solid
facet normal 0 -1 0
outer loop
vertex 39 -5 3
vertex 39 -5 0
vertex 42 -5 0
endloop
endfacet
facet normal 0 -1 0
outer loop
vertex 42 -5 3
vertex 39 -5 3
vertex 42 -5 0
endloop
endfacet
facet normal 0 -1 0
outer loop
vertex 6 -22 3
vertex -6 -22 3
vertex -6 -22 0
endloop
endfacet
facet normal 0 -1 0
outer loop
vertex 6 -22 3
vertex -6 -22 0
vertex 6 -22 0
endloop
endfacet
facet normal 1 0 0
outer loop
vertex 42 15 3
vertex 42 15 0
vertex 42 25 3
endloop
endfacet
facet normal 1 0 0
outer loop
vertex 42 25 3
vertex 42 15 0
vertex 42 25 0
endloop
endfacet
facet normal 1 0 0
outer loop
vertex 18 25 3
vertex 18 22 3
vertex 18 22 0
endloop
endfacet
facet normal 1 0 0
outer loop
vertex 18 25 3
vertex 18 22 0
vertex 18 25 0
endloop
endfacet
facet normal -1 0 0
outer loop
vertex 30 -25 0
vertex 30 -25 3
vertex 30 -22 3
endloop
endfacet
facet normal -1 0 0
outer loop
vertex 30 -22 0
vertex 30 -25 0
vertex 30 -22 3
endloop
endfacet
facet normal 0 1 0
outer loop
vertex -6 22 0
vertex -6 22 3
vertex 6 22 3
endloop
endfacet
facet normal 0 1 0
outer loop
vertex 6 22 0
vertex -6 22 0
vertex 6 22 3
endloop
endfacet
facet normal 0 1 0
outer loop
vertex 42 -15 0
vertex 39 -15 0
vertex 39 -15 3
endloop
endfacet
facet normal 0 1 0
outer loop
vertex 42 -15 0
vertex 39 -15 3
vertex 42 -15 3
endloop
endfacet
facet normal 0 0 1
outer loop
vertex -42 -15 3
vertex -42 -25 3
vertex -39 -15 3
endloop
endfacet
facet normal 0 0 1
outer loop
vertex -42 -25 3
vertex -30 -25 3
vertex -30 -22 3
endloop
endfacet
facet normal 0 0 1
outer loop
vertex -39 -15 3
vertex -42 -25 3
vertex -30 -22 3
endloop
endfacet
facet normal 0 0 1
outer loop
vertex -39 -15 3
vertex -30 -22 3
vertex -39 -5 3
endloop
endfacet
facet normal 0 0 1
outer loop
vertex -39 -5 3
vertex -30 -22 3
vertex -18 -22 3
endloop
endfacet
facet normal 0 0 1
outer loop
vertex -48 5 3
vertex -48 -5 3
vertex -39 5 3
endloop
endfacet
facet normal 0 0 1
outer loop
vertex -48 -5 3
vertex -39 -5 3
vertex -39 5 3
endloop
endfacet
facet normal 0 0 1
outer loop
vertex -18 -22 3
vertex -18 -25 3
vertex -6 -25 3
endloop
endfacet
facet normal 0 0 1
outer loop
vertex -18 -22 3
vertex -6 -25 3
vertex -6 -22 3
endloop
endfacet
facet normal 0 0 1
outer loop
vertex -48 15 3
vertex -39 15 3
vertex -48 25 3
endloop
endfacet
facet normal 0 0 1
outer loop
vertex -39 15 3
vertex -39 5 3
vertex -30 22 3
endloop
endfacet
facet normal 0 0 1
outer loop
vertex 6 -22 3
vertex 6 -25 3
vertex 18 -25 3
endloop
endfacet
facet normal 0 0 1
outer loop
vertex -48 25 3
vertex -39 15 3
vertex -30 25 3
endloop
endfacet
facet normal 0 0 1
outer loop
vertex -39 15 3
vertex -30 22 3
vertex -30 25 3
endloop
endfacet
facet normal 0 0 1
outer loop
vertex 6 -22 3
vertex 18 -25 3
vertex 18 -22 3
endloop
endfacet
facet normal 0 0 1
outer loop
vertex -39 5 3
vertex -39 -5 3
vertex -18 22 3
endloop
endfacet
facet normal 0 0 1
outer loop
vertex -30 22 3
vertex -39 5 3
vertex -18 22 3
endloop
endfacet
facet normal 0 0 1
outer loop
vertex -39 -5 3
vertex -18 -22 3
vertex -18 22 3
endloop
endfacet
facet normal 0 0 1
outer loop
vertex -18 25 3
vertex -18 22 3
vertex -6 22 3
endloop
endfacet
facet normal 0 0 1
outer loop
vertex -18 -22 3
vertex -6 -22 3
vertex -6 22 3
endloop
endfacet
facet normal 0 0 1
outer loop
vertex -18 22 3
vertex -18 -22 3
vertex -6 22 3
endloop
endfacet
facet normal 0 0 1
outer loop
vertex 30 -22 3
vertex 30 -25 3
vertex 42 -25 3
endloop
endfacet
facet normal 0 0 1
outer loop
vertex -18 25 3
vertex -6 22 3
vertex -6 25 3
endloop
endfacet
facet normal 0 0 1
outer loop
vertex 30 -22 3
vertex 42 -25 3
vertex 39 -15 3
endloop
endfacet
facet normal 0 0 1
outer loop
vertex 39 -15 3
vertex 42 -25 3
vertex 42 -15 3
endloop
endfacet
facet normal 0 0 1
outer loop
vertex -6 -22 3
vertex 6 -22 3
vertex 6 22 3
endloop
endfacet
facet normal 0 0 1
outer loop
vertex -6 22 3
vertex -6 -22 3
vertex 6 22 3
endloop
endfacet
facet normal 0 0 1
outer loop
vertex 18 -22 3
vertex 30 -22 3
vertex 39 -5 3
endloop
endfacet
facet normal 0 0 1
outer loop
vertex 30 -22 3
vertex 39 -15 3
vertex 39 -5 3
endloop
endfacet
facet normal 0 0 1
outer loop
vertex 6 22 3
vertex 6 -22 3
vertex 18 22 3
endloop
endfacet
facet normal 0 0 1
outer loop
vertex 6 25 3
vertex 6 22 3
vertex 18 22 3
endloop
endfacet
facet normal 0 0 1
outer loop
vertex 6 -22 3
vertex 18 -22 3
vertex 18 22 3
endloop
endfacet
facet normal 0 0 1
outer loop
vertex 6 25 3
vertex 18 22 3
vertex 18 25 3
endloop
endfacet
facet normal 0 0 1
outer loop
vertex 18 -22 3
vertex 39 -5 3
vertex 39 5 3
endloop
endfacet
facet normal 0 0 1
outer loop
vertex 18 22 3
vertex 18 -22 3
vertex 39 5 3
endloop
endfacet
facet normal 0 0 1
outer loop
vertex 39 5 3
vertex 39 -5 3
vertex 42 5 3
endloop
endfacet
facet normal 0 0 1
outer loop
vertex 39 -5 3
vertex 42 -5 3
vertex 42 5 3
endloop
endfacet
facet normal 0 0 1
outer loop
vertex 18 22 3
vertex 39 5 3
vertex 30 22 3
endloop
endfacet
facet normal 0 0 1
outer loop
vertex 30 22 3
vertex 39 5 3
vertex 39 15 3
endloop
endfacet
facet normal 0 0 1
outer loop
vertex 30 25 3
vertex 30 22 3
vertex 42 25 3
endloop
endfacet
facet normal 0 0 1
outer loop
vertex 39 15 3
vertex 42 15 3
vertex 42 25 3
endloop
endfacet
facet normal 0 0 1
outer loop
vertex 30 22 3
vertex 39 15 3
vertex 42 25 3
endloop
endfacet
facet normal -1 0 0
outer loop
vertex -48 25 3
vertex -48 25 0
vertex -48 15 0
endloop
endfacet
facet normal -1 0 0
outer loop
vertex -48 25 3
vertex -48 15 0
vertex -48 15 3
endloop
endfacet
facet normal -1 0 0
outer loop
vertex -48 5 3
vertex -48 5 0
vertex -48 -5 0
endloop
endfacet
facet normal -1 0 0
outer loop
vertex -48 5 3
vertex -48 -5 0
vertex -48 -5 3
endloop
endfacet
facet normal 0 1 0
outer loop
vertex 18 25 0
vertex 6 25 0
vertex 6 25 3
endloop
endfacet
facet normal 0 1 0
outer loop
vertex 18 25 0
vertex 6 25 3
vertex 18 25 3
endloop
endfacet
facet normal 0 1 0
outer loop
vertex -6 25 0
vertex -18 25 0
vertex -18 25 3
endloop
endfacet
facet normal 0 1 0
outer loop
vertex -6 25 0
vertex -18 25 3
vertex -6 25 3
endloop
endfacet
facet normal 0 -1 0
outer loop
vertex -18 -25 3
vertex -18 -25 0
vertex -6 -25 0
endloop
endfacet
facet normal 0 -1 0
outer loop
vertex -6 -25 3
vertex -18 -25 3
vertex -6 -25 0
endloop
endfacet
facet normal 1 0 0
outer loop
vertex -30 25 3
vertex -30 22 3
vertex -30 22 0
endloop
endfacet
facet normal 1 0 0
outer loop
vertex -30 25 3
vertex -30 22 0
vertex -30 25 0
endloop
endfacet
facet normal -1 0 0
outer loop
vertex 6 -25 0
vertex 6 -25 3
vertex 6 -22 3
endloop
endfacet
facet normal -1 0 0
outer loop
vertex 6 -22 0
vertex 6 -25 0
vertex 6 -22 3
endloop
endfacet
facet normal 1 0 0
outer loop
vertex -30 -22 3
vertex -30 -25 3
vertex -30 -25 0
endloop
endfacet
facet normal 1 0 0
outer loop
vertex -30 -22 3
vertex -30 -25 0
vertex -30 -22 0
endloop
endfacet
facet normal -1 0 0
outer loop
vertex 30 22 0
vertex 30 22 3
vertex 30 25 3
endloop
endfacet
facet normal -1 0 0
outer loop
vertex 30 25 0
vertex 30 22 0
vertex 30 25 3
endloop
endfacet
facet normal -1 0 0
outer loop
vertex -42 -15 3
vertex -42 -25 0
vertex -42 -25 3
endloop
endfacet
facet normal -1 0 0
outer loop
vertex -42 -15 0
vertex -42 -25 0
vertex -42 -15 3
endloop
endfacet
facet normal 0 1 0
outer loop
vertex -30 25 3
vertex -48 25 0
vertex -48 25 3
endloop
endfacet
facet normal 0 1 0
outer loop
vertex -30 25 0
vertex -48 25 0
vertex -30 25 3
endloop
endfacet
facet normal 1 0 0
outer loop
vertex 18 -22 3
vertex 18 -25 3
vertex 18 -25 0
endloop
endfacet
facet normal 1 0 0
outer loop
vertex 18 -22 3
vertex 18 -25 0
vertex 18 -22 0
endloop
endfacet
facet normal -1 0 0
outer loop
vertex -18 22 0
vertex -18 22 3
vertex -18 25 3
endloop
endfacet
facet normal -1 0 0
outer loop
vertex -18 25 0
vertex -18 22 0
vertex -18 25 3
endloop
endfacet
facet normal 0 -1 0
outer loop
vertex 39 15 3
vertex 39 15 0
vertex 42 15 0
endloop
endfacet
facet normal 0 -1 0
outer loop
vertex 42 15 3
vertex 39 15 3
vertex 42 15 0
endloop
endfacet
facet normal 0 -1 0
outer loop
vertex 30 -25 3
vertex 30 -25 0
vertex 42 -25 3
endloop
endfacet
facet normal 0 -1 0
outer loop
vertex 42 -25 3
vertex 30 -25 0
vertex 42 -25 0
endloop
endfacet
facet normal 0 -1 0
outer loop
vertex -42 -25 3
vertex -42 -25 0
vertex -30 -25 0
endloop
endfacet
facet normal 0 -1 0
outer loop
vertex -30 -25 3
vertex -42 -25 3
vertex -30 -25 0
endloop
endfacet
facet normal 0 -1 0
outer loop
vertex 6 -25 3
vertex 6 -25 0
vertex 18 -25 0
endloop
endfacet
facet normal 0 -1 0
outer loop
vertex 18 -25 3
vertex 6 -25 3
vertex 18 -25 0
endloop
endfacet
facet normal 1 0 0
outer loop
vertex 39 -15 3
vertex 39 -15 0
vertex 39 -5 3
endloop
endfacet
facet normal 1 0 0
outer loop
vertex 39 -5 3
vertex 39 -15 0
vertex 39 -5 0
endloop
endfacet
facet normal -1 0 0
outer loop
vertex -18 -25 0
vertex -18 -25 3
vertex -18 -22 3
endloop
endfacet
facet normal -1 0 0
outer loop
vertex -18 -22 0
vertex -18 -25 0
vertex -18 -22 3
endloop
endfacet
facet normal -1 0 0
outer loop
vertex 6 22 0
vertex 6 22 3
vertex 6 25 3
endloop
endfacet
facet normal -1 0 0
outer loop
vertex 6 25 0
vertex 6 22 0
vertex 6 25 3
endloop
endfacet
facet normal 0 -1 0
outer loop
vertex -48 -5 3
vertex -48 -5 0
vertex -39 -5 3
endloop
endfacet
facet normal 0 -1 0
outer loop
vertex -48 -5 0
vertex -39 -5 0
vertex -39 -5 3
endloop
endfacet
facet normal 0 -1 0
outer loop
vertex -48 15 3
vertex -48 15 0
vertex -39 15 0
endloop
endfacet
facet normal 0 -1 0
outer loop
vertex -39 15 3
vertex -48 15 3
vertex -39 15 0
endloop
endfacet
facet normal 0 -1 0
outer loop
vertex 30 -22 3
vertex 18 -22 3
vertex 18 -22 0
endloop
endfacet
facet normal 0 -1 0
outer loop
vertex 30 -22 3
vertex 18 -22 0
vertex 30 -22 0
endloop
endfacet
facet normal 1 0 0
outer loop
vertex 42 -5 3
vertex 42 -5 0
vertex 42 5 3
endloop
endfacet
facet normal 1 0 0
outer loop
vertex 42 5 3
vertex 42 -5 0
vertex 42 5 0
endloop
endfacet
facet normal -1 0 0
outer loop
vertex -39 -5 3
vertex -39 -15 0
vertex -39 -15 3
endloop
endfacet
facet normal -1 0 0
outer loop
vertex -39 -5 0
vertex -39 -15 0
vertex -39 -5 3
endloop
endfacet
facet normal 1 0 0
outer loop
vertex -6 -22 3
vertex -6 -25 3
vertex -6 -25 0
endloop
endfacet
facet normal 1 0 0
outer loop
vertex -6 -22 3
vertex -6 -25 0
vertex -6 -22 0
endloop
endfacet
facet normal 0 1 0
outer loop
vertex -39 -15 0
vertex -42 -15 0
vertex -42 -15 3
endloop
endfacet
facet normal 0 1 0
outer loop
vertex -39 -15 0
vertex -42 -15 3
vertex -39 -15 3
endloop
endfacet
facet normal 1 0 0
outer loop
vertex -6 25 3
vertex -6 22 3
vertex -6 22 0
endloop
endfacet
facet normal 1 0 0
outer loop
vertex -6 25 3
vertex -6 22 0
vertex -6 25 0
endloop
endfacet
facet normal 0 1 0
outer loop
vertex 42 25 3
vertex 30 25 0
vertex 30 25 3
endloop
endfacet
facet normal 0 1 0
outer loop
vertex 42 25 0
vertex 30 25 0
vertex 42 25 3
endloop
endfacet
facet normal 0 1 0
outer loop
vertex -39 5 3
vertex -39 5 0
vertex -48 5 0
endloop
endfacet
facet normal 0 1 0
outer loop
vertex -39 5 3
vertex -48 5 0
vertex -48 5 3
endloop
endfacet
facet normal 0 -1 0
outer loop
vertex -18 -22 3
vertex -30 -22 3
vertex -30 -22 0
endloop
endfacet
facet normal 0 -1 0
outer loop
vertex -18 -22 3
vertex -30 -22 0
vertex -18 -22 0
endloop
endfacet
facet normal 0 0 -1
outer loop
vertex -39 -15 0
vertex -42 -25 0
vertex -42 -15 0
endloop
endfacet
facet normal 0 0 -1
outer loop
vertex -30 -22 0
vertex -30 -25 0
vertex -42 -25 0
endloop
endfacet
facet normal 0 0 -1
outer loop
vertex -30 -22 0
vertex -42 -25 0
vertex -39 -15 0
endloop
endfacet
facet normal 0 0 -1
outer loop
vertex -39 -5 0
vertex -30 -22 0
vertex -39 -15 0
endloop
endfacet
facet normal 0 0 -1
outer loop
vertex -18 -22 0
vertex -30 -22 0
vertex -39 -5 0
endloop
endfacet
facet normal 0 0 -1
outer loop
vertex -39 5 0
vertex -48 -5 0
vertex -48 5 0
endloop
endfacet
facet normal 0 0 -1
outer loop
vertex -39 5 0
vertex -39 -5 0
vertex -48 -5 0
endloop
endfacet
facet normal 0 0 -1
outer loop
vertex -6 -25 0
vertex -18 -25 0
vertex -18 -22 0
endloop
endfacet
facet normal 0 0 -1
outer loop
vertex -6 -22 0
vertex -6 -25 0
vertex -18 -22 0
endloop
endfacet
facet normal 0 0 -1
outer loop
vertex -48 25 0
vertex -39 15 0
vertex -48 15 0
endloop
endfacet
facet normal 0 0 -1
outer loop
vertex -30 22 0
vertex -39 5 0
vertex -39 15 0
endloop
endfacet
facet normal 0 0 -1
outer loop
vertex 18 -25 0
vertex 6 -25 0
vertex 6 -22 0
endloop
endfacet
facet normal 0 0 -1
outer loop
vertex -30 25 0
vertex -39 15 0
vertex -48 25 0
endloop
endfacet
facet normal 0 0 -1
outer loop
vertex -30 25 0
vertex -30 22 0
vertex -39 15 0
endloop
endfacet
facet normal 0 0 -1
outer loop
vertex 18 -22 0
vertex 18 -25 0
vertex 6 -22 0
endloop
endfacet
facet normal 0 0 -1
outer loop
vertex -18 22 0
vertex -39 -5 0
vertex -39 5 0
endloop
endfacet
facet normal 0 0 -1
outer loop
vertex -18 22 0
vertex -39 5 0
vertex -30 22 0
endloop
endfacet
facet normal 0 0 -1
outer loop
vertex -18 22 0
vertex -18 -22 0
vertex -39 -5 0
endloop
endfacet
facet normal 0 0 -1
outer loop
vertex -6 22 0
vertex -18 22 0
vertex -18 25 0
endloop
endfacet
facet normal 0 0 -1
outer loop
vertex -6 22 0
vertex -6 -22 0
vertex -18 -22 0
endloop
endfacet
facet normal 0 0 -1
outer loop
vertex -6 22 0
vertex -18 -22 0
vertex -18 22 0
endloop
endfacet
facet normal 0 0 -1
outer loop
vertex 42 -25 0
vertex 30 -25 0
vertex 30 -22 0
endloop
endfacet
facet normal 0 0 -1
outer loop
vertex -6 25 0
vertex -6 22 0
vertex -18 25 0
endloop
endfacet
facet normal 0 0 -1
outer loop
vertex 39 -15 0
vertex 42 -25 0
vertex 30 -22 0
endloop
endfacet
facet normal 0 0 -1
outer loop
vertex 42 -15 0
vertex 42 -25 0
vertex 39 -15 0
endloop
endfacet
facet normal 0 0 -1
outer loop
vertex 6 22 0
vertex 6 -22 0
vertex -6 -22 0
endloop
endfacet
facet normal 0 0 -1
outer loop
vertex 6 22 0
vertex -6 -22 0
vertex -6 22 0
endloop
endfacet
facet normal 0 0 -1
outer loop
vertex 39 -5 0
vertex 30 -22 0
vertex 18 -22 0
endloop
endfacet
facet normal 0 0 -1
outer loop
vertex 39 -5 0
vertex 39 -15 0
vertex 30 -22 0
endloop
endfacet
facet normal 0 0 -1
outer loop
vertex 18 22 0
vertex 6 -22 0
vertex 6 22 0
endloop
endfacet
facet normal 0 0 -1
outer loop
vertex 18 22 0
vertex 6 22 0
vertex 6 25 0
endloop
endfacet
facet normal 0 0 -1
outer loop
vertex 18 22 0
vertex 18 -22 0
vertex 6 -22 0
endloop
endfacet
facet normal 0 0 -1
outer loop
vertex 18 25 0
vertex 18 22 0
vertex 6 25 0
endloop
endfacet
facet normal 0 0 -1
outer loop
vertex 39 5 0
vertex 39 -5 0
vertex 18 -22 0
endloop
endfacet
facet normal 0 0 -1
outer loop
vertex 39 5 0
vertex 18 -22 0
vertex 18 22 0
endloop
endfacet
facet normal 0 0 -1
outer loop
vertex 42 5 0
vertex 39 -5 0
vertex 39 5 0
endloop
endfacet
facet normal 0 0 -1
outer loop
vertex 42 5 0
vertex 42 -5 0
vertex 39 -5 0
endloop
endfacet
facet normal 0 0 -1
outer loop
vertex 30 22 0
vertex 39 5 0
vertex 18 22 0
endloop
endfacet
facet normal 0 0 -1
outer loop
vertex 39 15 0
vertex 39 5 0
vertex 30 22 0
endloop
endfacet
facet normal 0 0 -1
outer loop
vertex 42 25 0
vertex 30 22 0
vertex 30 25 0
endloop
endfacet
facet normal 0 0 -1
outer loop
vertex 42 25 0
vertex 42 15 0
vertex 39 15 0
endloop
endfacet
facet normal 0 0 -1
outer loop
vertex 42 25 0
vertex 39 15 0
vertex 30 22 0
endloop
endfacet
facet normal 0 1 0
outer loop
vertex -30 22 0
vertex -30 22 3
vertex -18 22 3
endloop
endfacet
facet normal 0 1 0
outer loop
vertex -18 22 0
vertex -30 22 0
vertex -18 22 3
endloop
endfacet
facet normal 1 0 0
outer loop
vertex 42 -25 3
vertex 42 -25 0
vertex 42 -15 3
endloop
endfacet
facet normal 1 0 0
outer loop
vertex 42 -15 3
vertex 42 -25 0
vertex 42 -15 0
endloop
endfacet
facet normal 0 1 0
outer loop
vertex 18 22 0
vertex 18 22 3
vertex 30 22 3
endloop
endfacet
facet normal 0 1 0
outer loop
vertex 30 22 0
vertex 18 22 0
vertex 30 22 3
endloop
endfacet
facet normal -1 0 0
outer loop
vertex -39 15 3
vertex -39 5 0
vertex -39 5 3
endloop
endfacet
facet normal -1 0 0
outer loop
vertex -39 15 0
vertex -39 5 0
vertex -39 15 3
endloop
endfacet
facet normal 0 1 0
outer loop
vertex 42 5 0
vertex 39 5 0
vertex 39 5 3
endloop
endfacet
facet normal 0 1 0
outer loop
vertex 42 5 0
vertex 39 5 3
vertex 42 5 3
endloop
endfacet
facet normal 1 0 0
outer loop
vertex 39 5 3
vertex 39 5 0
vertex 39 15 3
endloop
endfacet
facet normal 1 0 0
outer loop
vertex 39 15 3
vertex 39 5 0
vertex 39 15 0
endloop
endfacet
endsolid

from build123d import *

# Parameters (mm, degrees)
ESBO_O4_W                = 84
ESBO_O4_H                = 50
RESSALTO_EXTRUS_O2_DEPTH = 3
CORTE_EXTRUS_O2_REACH    = 50.969
ESBO_O5_W                = 12
ESBO_O5_H                = 3
CORTE_EXTRUS_O4_REACH    = 50.969
ESBO_O6_W                = 3
ESBO_O6_H                = 10
ESBO_O11_W               = 3
ESBO_O11_H               = 10
RESSALTO_EXTRUS_O4_DEPTH = 6


with BuildPart() as part:
    # Esboço4 → Ressalto-extrusão2 (new body)
    with BuildSketch(Plane.XY):
        Rectangle(ESBO_O4_W, ESBO_O4_H)
    extrude(amount=RESSALTO_EXTRUS_O2_DEPTH)

    # Esboço5 → Corte-extrusão2 (cut, up to next)
    with BuildSketch(Plane.XY.offset(3), mode=Mode.PRIVATE) as corte_extrus_o2_sk1:
        with Locations((24, 23.5)):
            Rectangle(ESBO_O5_W, ESBO_O5_H)
    corte_extrus_o2_tool1 = extrude(corte_extrus_o2_sk1.sketch, amount=-CORTE_EXTRUS_O2_REACH, mode=Mode.PRIVATE) & part.part
    # Esboço5 → Corte-extrusão2 (cut, up to next)
    with BuildSketch(Plane.XY.offset(3), mode=Mode.PRIVATE) as corte_extrus_o2_sk2:
        with Locations((-24, 23.5)):
            Rectangle(ESBO_O5_W, ESBO_O5_H)
    corte_extrus_o2_tool2 = extrude(corte_extrus_o2_sk2.sketch, amount=-CORTE_EXTRUS_O2_REACH, mode=Mode.PRIVATE) & part.part
    # Esboço5 → Corte-extrusão2 (cut, up to next)
    with BuildSketch(Plane.XY.offset(3), mode=Mode.PRIVATE) as corte_extrus_o2_sk3:
        with Locations((0, 23.5)):
            Rectangle(ESBO_O5_W, ESBO_O5_H)
    corte_extrus_o2_tool3 = extrude(corte_extrus_o2_sk3.sketch, amount=-CORTE_EXTRUS_O2_REACH, mode=Mode.PRIVATE) & part.part
    # Esboço5 → Corte-extrusão2 (cut, up to next)
    with BuildSketch(Plane.XY.offset(3), mode=Mode.PRIVATE) as corte_extrus_o2_sk4:
        with Locations((0, -23.5)):
            Rectangle(ESBO_O5_W, ESBO_O5_H)
    corte_extrus_o2_tool4 = extrude(corte_extrus_o2_sk4.sketch, amount=-CORTE_EXTRUS_O2_REACH, mode=Mode.PRIVATE) & part.part
    # Esboço5 → Corte-extrusão2 (cut, up to next)
    with BuildSketch(Plane.XY.offset(3), mode=Mode.PRIVATE) as corte_extrus_o2_sk5:
        with Locations((-24, -23.5)):
            Rectangle(ESBO_O5_W, ESBO_O5_H)
    corte_extrus_o2_tool5 = extrude(corte_extrus_o2_sk5.sketch, amount=-CORTE_EXTRUS_O2_REACH, mode=Mode.PRIVATE) & part.part
    # Esboço5 → Corte-extrusão2 (cut, up to next)
    with BuildSketch(Plane.XY.offset(3), mode=Mode.PRIVATE) as corte_extrus_o2_sk6:
        with Locations((24, -23.5)):
            Rectangle(ESBO_O5_W, ESBO_O5_H)
    corte_extrus_o2_tool6 = extrude(corte_extrus_o2_sk6.sketch, amount=-CORTE_EXTRUS_O2_REACH, mode=Mode.PRIVATE) & part.part
    add(corte_extrus_o2_tool1.solids().sort_by_distance((24, 23.5, 3))[0], mode=Mode.SUBTRACT)
    add(corte_extrus_o2_tool2.solids().sort_by_distance((-24, 23.5, 3))[0], mode=Mode.SUBTRACT)
    add(corte_extrus_o2_tool3.solids().sort_by_distance((0, 23.5, 3))[0], mode=Mode.SUBTRACT)
    add(corte_extrus_o2_tool4.solids().sort_by_distance((0, -23.5, 3))[0], mode=Mode.SUBTRACT)
    add(corte_extrus_o2_tool5.solids().sort_by_distance((-24, -23.5, 3))[0], mode=Mode.SUBTRACT)
    add(corte_extrus_o2_tool6.solids().sort_by_distance((24, -23.5, 3))[0], mode=Mode.SUBTRACT)

    # Esboço6 → Corte-extrusão4 (cut, up to next)
    with BuildSketch(Plane.XY, mode=Mode.PRIVATE) as corte_extrus_o4_sk1:
        with Locations((40.5, 10)):
            Rectangle(ESBO_O6_W, ESBO_O6_H)
    corte_extrus_o4_tool1 = extrude(corte_extrus_o4_sk1.sketch, amount=CORTE_EXTRUS_O4_REACH, mode=Mode.PRIVATE) & part.part
    # Esboço6 → Corte-extrusão4 (cut, up to next)
    with BuildSketch(Plane.XY, mode=Mode.PRIVATE) as corte_extrus_o4_sk2:
        with Locations((-40.5, 10)):
            Rectangle(ESBO_O6_W, ESBO_O6_H)
    corte_extrus_o4_tool2 = extrude(corte_extrus_o4_sk2.sketch, amount=CORTE_EXTRUS_O4_REACH, mode=Mode.PRIVATE) & part.part
    # Esboço6 → Corte-extrusão4 (cut, up to next)
    with BuildSketch(Plane.XY, mode=Mode.PRIVATE) as corte_extrus_o4_sk3:
        with Locations((-40.5, -10)):
            Rectangle(ESBO_O6_W, ESBO_O6_H)
    corte_extrus_o4_tool3 = extrude(corte_extrus_o4_sk3.sketch, amount=CORTE_EXTRUS_O4_REACH, mode=Mode.PRIVATE) & part.part
    # Esboço6 → Corte-extrusão4 (cut, up to next)
    with BuildSketch(Plane.XY, mode=Mode.PRIVATE) as corte_extrus_o4_sk4:
        with Locations((40.5, -10)):
            Rectangle(ESBO_O6_W, ESBO_O6_H)
    corte_extrus_o4_tool4 = extrude(corte_extrus_o4_sk4.sketch, amount=CORTE_EXTRUS_O4_REACH, mode=Mode.PRIVATE) & part.part
    add(corte_extrus_o4_tool1.solids().sort_by_distance((40.5, 10, 0))[0], mode=Mode.SUBTRACT)
    add(corte_extrus_o4_tool2.solids().sort_by_distance((-40.5, 10, 0))[0], mode=Mode.SUBTRACT)
    add(corte_extrus_o4_tool3.solids().sort_by_distance((-40.5, -10, 0))[0], mode=Mode.SUBTRACT)
    add(corte_extrus_o4_tool4.solids().sort_by_distance((40.5, -10, 0))[0], mode=Mode.SUBTRACT)

    # Esboço11 → Ressalto-extrusão4 (add)
    with BuildSketch(Plane.ZY.offset(42)):
        with Locations((1.5, 0)):
            Rectangle(ESBO_O11_W, ESBO_O11_H)
        with Locations((1.5, 20)):
            Rectangle(ESBO_O11_W, ESBO_O11_H)
    extrude(amount=RESSALTO_EXTRUS_O4_DEPTH)


solid = part.part
